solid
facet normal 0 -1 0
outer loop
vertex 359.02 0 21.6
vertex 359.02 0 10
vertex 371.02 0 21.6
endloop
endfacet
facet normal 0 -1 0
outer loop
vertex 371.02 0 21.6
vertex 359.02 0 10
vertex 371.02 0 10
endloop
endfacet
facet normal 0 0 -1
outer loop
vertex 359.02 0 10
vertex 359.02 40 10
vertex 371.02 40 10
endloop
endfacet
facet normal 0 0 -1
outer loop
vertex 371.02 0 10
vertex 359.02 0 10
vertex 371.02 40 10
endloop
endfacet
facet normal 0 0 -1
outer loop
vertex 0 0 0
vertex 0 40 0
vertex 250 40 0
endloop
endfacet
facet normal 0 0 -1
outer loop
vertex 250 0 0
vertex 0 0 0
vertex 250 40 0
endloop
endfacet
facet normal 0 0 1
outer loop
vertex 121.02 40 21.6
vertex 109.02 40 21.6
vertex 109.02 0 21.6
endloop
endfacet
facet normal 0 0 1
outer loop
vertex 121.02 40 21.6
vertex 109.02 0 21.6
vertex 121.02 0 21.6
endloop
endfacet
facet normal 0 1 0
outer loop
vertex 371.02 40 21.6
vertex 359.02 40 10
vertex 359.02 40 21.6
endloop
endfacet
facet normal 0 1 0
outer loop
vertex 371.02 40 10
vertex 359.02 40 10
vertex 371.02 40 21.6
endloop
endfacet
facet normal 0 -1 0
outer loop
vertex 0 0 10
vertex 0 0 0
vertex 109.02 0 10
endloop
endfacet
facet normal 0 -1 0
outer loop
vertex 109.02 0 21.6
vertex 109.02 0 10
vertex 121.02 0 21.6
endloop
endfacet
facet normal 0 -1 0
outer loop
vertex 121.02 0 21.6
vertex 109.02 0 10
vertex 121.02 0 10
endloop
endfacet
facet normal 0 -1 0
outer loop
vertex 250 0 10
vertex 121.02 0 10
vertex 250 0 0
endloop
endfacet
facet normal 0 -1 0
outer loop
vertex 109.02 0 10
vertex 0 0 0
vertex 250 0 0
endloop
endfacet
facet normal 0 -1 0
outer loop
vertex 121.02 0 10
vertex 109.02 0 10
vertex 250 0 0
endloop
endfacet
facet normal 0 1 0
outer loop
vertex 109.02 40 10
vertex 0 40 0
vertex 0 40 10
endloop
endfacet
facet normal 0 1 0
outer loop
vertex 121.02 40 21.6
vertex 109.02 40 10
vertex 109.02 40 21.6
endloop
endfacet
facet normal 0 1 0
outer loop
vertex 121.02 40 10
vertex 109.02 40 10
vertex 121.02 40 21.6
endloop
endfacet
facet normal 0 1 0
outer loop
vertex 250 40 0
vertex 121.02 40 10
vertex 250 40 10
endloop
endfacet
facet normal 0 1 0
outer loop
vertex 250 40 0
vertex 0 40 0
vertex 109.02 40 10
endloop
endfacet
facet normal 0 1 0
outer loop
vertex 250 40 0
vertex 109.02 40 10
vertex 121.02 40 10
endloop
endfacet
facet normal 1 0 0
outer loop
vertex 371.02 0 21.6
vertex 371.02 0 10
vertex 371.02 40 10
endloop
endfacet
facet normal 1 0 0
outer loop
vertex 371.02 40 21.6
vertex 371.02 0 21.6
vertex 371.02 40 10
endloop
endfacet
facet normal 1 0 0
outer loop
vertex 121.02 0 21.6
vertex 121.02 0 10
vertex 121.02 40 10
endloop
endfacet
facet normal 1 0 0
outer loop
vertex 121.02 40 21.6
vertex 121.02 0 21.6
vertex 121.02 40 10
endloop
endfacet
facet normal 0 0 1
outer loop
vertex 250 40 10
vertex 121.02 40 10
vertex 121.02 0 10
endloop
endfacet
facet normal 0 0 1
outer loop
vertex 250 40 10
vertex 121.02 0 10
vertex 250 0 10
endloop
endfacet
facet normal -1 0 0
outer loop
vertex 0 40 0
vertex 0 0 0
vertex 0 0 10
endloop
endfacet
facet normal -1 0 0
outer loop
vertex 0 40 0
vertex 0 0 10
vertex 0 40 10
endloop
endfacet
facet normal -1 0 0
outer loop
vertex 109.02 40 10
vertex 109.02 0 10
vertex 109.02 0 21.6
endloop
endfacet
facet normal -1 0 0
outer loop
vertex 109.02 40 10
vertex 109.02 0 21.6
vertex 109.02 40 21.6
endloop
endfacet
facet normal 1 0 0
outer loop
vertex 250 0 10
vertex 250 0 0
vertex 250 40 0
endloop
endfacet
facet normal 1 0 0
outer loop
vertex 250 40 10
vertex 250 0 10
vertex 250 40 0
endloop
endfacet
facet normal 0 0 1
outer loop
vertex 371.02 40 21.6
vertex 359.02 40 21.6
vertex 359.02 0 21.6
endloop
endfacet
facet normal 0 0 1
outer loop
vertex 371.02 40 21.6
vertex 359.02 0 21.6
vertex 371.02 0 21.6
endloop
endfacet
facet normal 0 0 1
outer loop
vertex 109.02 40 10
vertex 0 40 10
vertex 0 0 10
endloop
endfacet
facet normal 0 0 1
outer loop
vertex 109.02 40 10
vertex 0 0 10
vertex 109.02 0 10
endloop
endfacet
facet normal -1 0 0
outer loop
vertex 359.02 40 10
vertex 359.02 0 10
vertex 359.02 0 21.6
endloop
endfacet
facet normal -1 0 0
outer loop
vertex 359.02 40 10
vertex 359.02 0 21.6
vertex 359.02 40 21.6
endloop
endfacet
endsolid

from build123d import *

# Parameters (mm, degrees)
ESQUISSE1_W        = 250
ESQUISSE1_H        = 40
BOSS_EXTRU_1_DEPTH = 10
ESQUISSE2_W        = 12
ESQUISSE2_H        = 40
BOSS_EXTRU_2_DEPTH = 11.6


with BuildPart() as part:
    # Esquisse1 → Boss.-Extru.1 (new body)
    with BuildSketch(Plane.XY):
        with Locations((125, 20)):
            Rectangle(ESQUISSE1_W, ESQUISSE1_H)
    extrude(amount=BOSS_EXTRU_1_DEPTH)

    # Esquisse2 → Boss.-Extru.2 (add)
    with BuildSketch(Plane.XY.offset(10)):
        with Locations((115.02, 20)):
            Rectangle(ESQUISSE2_W, ESQUISSE2_H)
        with Locations((365.02, 20)):
            Rectangle(ESQUISSE2_W, ESQUISSE2_H)
    extrude(amount=BOSS_EXTRU_2_DEPTH)


with BuildPart() as boss_extru_2_piece_1:
    # of the separate pieces the step leaves, piece 1, a body of its own (boss_extru_2_pieces)
    add(part.part.solids().sort_by_distance((0, 0, 0))[0])


with BuildPart() as boss_extru_2_piece_2:
    # of the separate pieces the step leaves, piece 2, a body of its own (boss_extru_2_pieces)
    add(part.part.solids().sort_by_distance((359.02, 40, 10))[0])


solid = Compound([boss_extru_2_piece_1.part, boss_extru_2_piece_2.part])
